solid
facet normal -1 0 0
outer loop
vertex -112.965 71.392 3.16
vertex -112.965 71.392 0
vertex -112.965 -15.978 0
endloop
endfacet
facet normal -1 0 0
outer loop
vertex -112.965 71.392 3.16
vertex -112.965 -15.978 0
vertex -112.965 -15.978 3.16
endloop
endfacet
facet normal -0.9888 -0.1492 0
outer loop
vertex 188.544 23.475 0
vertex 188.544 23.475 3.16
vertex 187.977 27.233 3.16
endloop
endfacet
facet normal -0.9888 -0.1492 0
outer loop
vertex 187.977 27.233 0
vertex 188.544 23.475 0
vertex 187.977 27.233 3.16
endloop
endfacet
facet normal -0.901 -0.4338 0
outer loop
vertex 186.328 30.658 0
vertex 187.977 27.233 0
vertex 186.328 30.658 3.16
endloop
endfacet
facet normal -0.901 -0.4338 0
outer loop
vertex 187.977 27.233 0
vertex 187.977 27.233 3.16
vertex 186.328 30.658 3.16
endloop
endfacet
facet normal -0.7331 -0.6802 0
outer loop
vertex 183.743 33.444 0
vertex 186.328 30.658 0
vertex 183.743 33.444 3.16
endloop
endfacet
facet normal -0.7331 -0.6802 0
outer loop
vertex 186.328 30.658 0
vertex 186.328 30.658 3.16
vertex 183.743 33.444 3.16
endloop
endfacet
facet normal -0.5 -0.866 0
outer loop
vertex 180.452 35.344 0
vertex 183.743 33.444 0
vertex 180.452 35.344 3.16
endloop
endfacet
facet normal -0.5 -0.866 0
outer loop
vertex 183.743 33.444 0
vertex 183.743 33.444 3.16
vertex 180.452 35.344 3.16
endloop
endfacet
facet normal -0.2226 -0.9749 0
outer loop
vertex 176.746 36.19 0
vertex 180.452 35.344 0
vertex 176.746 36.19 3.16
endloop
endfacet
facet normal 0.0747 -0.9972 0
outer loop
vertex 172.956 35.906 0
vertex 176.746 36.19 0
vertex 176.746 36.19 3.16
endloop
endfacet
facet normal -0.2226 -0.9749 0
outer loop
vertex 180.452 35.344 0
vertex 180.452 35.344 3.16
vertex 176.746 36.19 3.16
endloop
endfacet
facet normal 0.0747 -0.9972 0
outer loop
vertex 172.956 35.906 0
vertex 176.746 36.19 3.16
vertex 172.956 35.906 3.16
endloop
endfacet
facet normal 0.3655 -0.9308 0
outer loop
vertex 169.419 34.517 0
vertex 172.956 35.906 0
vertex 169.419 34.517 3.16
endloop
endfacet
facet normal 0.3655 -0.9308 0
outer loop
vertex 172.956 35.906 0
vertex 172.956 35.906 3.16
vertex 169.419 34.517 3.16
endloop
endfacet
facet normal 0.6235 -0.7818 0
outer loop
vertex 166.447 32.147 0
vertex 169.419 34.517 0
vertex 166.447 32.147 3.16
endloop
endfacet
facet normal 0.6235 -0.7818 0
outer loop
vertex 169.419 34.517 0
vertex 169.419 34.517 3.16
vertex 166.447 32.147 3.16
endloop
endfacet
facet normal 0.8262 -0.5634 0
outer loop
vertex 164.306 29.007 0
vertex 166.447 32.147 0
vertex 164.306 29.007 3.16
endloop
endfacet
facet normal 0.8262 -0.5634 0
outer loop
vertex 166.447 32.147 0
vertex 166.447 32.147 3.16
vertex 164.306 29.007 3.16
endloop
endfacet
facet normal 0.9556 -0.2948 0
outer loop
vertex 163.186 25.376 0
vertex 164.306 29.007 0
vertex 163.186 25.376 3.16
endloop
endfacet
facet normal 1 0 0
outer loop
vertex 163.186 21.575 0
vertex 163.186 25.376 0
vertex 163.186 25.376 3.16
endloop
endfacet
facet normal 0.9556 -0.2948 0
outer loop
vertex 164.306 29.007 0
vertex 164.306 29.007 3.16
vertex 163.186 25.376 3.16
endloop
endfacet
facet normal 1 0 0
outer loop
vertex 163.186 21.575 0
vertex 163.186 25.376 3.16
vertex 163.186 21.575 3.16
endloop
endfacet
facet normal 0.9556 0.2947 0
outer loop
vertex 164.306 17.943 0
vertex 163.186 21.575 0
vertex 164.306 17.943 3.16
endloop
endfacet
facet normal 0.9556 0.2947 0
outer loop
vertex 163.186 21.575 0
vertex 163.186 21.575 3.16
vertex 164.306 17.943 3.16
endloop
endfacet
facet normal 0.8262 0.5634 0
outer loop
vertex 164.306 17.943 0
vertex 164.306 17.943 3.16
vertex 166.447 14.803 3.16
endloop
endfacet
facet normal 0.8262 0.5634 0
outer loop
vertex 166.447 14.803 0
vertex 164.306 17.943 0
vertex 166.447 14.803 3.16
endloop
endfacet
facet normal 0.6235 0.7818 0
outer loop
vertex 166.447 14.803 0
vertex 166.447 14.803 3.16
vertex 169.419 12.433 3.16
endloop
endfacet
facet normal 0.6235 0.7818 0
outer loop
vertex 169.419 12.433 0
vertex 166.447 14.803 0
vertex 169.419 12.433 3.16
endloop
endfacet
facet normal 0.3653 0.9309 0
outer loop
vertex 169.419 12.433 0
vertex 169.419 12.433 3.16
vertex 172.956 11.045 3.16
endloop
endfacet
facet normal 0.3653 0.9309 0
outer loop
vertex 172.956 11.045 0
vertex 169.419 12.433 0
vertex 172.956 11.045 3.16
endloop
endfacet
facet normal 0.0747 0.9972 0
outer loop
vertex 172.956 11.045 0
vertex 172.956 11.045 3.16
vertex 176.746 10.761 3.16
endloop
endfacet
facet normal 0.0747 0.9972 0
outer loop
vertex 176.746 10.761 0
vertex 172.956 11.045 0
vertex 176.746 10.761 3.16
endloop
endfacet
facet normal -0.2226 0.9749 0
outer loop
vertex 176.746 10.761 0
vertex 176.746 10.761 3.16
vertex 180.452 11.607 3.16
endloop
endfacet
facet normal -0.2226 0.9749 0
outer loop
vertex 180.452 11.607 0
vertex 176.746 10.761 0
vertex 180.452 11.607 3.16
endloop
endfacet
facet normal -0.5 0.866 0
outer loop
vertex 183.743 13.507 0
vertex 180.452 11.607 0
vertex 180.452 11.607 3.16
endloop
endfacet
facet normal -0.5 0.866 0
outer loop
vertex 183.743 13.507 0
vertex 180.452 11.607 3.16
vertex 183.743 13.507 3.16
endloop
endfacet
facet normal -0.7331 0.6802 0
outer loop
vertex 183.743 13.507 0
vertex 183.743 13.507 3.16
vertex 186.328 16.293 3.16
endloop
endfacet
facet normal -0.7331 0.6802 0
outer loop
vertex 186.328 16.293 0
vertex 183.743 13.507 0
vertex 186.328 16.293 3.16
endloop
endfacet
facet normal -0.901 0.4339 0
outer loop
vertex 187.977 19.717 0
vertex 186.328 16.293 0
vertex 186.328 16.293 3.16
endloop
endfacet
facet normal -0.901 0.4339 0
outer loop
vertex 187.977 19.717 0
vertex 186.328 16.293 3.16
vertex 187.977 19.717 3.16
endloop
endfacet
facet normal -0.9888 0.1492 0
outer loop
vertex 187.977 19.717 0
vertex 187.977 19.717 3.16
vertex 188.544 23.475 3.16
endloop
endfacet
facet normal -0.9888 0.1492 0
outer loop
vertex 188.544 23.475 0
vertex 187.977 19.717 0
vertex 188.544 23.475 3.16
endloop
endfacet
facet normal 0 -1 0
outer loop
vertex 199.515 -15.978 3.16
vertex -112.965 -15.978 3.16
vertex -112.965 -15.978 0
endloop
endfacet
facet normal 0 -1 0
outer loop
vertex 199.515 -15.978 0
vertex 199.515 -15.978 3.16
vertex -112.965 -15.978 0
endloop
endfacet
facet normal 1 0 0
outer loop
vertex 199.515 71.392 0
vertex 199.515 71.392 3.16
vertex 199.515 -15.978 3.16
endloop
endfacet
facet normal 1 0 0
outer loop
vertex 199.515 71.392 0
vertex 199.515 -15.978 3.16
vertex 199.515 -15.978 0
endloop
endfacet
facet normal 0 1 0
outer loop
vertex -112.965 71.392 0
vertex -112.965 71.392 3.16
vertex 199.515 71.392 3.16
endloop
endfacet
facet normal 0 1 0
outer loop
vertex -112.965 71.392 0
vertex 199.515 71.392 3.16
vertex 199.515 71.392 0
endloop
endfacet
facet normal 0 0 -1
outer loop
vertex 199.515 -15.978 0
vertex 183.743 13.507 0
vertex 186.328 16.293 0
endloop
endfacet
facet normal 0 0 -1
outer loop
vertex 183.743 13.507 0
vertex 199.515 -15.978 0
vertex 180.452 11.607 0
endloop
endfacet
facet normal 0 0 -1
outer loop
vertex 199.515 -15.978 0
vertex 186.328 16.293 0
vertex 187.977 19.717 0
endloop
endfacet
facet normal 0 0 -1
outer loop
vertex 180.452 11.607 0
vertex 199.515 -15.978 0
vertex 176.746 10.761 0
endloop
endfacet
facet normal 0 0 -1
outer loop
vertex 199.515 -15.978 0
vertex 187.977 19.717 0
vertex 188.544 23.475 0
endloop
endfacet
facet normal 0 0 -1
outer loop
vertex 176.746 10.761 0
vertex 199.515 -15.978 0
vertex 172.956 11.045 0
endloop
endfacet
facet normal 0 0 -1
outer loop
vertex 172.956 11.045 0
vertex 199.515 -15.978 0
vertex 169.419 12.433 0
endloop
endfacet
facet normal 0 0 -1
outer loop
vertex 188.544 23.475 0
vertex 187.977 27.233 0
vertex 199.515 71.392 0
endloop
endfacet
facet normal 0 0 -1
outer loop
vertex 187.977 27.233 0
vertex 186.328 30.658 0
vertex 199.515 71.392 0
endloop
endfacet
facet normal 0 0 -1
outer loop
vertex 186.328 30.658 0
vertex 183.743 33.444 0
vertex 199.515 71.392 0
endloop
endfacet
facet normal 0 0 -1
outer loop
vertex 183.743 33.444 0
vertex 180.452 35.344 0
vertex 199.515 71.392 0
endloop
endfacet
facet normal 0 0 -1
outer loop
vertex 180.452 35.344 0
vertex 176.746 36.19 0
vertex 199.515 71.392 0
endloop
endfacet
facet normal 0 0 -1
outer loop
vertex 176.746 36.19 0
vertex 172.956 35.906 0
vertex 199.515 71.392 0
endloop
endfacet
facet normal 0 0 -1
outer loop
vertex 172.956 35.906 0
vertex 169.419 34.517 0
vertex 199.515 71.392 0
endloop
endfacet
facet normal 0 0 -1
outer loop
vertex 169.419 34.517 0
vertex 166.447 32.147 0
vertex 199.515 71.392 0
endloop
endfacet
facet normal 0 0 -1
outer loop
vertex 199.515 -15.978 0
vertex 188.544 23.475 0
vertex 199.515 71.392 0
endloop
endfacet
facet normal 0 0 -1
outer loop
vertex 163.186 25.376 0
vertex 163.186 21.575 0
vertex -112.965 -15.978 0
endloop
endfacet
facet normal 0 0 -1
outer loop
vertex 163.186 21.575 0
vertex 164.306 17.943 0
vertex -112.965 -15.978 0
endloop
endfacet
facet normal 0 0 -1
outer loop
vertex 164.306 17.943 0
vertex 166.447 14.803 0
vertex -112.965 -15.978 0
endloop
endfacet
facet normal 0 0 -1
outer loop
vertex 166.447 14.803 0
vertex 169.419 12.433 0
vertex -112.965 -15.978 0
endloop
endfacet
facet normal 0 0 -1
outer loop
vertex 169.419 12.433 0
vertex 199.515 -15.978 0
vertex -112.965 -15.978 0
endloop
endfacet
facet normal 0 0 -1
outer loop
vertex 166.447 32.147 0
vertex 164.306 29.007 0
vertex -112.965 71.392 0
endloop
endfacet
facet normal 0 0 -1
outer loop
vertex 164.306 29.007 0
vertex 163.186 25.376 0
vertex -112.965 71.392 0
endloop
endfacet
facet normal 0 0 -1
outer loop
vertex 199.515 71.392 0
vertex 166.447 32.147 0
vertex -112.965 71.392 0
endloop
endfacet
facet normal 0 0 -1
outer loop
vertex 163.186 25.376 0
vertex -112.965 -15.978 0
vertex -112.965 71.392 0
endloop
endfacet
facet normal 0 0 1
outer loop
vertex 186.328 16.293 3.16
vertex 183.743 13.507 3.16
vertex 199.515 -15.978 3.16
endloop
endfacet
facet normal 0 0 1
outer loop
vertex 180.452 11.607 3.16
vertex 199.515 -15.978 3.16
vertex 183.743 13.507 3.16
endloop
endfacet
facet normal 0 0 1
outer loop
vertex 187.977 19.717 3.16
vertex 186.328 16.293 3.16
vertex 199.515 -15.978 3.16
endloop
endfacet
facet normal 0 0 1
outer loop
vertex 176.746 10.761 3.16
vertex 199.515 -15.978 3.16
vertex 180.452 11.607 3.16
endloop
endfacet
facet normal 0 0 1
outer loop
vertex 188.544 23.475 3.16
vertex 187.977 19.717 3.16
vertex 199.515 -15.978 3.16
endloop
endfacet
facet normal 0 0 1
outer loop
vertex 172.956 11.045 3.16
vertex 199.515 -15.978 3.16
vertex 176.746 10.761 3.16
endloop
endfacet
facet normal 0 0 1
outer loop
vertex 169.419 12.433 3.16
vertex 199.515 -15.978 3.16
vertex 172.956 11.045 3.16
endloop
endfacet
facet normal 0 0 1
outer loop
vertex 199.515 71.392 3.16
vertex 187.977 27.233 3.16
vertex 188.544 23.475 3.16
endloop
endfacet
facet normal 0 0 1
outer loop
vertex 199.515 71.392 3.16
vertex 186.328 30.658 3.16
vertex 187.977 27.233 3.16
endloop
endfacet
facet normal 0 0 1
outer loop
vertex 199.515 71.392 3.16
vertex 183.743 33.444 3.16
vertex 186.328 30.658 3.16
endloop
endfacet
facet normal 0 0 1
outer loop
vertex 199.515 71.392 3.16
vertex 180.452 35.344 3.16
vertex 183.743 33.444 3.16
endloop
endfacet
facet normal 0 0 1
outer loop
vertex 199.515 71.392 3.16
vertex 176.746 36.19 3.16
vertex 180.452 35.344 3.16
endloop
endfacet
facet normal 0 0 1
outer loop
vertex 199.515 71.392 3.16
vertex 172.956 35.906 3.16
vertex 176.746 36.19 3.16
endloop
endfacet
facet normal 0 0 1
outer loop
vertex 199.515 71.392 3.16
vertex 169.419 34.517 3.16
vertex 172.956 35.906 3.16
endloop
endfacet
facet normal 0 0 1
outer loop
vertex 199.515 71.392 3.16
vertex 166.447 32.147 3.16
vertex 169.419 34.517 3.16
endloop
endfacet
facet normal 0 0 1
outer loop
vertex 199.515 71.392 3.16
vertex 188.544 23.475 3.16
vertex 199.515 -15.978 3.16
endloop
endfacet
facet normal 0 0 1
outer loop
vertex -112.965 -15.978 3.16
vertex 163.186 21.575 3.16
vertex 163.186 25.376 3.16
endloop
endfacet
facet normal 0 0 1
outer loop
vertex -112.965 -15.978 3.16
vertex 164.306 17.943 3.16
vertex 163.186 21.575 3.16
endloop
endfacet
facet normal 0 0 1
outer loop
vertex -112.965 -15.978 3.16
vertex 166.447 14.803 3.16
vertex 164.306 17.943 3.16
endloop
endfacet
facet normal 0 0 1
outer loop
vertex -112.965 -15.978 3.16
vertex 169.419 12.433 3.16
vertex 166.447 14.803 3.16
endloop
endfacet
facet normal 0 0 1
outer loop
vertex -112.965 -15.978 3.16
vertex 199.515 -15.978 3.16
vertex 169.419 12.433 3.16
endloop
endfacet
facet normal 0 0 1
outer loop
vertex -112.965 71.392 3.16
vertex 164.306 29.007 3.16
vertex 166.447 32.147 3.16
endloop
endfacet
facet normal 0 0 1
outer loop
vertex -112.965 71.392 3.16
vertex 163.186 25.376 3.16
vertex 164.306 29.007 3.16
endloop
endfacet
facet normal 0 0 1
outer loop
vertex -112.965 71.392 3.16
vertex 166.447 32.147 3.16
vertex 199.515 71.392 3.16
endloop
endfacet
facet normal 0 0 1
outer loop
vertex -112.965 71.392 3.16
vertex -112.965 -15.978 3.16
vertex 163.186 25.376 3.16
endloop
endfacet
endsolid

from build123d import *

# Parameters (mm, degrees)
SKETCH2_W           = 77.34
SKETCH2_H           = 87.37
BOSS_EXTRUDE1_DEPTH = 3.16
SKETCH_3_W          = 3.16
SKETCH_3_H          = 87.37
EXTRUDE_3_DEPTH     = 80
SKETCH_4_W          = 3.16
SKETCH_4_H          = 87.37
EXTRUDE_4_DEPTH     = 60
SKETCH_5_W          = 3.16
SKETCH_5_H          = 87.37
EXTRUDE_5_DEPTH     = 113
SKETCH_6_W          = 3.16
SKETCH_6_H          = 87.37
CUT_EXTRUDE_1_DEPTH = 17.86
SKETCH_8_R          = 12.75
CUT_EXTRUDE_2_DEPTH = 10


with BuildPart() as part:
    # Sketch2 → Boss-Extrude1 (new body)
    with BuildSketch(Plane.XY):
        with Locations((-14.294928595, 27.706753385)):
            Rectangle(SKETCH2_W, SKETCH2_H)
    extrude(amount=BOSS_EXTRUDE1_DEPTH)

    # 草图3 → 凸台-拉伸3 (add)
    with BuildSketch(Plane(origin=(24.375071405, 0, 0), x_dir=(0, 0, -1), z_dir=(1, 0, 0))):
        with Locations((-1.58, 27.706753385)):
            Rectangle(SKETCH_3_W, SKETCH_3_H)
    extrude(amount=EXTRUDE_3_DEPTH)

    # 草图4 → 凸台-拉伸4 (add)
    with BuildSketch(Plane.ZY.offset(52.964928595)):
        with Locations((1.58, 27.706753385)):
            Rectangle(SKETCH_4_W, SKETCH_4_H)
    extrude(amount=EXTRUDE_4_DEPTH)

    # 草图5 → 凸台-拉伸5 (add)
    with BuildSketch(Plane(origin=(104.375071405, 0, 0), x_dir=(0, 0, -1), z_dir=(1, 0, 0))):
        with Locations((-1.58, 27.706753385)):
            Rectangle(SKETCH_5_W, SKETCH_5_H)
    extrude(amount=EXTRUDE_5_DEPTH)

    # 草图6 → 切除-拉伸1 (cut)
    with BuildSketch(Plane(origin=(217.375071405, 0, 0), x_dir=(0, 0, -1), z_dir=(1, 0, 0))):
        with Locations((-1.58, 27.706753385)):
            Rectangle(SKETCH_6_W, SKETCH_6_H)
    extrude(amount=-CUT_EXTRUDE_1_DEPTH, mode=Mode.SUBTRACT)

    # 草图8 → 切除-拉伸2 (cut)
    with BuildSketch(Plane.XY.offset(3.16)):
        with Locations((175.79355983, 23.47529756)):
            Circle(SKETCH_8_R)
    extrude(amount=-CUT_EXTRUDE_2_DEPTH, mode=Mode.SUBTRACT)


solid = part.part
